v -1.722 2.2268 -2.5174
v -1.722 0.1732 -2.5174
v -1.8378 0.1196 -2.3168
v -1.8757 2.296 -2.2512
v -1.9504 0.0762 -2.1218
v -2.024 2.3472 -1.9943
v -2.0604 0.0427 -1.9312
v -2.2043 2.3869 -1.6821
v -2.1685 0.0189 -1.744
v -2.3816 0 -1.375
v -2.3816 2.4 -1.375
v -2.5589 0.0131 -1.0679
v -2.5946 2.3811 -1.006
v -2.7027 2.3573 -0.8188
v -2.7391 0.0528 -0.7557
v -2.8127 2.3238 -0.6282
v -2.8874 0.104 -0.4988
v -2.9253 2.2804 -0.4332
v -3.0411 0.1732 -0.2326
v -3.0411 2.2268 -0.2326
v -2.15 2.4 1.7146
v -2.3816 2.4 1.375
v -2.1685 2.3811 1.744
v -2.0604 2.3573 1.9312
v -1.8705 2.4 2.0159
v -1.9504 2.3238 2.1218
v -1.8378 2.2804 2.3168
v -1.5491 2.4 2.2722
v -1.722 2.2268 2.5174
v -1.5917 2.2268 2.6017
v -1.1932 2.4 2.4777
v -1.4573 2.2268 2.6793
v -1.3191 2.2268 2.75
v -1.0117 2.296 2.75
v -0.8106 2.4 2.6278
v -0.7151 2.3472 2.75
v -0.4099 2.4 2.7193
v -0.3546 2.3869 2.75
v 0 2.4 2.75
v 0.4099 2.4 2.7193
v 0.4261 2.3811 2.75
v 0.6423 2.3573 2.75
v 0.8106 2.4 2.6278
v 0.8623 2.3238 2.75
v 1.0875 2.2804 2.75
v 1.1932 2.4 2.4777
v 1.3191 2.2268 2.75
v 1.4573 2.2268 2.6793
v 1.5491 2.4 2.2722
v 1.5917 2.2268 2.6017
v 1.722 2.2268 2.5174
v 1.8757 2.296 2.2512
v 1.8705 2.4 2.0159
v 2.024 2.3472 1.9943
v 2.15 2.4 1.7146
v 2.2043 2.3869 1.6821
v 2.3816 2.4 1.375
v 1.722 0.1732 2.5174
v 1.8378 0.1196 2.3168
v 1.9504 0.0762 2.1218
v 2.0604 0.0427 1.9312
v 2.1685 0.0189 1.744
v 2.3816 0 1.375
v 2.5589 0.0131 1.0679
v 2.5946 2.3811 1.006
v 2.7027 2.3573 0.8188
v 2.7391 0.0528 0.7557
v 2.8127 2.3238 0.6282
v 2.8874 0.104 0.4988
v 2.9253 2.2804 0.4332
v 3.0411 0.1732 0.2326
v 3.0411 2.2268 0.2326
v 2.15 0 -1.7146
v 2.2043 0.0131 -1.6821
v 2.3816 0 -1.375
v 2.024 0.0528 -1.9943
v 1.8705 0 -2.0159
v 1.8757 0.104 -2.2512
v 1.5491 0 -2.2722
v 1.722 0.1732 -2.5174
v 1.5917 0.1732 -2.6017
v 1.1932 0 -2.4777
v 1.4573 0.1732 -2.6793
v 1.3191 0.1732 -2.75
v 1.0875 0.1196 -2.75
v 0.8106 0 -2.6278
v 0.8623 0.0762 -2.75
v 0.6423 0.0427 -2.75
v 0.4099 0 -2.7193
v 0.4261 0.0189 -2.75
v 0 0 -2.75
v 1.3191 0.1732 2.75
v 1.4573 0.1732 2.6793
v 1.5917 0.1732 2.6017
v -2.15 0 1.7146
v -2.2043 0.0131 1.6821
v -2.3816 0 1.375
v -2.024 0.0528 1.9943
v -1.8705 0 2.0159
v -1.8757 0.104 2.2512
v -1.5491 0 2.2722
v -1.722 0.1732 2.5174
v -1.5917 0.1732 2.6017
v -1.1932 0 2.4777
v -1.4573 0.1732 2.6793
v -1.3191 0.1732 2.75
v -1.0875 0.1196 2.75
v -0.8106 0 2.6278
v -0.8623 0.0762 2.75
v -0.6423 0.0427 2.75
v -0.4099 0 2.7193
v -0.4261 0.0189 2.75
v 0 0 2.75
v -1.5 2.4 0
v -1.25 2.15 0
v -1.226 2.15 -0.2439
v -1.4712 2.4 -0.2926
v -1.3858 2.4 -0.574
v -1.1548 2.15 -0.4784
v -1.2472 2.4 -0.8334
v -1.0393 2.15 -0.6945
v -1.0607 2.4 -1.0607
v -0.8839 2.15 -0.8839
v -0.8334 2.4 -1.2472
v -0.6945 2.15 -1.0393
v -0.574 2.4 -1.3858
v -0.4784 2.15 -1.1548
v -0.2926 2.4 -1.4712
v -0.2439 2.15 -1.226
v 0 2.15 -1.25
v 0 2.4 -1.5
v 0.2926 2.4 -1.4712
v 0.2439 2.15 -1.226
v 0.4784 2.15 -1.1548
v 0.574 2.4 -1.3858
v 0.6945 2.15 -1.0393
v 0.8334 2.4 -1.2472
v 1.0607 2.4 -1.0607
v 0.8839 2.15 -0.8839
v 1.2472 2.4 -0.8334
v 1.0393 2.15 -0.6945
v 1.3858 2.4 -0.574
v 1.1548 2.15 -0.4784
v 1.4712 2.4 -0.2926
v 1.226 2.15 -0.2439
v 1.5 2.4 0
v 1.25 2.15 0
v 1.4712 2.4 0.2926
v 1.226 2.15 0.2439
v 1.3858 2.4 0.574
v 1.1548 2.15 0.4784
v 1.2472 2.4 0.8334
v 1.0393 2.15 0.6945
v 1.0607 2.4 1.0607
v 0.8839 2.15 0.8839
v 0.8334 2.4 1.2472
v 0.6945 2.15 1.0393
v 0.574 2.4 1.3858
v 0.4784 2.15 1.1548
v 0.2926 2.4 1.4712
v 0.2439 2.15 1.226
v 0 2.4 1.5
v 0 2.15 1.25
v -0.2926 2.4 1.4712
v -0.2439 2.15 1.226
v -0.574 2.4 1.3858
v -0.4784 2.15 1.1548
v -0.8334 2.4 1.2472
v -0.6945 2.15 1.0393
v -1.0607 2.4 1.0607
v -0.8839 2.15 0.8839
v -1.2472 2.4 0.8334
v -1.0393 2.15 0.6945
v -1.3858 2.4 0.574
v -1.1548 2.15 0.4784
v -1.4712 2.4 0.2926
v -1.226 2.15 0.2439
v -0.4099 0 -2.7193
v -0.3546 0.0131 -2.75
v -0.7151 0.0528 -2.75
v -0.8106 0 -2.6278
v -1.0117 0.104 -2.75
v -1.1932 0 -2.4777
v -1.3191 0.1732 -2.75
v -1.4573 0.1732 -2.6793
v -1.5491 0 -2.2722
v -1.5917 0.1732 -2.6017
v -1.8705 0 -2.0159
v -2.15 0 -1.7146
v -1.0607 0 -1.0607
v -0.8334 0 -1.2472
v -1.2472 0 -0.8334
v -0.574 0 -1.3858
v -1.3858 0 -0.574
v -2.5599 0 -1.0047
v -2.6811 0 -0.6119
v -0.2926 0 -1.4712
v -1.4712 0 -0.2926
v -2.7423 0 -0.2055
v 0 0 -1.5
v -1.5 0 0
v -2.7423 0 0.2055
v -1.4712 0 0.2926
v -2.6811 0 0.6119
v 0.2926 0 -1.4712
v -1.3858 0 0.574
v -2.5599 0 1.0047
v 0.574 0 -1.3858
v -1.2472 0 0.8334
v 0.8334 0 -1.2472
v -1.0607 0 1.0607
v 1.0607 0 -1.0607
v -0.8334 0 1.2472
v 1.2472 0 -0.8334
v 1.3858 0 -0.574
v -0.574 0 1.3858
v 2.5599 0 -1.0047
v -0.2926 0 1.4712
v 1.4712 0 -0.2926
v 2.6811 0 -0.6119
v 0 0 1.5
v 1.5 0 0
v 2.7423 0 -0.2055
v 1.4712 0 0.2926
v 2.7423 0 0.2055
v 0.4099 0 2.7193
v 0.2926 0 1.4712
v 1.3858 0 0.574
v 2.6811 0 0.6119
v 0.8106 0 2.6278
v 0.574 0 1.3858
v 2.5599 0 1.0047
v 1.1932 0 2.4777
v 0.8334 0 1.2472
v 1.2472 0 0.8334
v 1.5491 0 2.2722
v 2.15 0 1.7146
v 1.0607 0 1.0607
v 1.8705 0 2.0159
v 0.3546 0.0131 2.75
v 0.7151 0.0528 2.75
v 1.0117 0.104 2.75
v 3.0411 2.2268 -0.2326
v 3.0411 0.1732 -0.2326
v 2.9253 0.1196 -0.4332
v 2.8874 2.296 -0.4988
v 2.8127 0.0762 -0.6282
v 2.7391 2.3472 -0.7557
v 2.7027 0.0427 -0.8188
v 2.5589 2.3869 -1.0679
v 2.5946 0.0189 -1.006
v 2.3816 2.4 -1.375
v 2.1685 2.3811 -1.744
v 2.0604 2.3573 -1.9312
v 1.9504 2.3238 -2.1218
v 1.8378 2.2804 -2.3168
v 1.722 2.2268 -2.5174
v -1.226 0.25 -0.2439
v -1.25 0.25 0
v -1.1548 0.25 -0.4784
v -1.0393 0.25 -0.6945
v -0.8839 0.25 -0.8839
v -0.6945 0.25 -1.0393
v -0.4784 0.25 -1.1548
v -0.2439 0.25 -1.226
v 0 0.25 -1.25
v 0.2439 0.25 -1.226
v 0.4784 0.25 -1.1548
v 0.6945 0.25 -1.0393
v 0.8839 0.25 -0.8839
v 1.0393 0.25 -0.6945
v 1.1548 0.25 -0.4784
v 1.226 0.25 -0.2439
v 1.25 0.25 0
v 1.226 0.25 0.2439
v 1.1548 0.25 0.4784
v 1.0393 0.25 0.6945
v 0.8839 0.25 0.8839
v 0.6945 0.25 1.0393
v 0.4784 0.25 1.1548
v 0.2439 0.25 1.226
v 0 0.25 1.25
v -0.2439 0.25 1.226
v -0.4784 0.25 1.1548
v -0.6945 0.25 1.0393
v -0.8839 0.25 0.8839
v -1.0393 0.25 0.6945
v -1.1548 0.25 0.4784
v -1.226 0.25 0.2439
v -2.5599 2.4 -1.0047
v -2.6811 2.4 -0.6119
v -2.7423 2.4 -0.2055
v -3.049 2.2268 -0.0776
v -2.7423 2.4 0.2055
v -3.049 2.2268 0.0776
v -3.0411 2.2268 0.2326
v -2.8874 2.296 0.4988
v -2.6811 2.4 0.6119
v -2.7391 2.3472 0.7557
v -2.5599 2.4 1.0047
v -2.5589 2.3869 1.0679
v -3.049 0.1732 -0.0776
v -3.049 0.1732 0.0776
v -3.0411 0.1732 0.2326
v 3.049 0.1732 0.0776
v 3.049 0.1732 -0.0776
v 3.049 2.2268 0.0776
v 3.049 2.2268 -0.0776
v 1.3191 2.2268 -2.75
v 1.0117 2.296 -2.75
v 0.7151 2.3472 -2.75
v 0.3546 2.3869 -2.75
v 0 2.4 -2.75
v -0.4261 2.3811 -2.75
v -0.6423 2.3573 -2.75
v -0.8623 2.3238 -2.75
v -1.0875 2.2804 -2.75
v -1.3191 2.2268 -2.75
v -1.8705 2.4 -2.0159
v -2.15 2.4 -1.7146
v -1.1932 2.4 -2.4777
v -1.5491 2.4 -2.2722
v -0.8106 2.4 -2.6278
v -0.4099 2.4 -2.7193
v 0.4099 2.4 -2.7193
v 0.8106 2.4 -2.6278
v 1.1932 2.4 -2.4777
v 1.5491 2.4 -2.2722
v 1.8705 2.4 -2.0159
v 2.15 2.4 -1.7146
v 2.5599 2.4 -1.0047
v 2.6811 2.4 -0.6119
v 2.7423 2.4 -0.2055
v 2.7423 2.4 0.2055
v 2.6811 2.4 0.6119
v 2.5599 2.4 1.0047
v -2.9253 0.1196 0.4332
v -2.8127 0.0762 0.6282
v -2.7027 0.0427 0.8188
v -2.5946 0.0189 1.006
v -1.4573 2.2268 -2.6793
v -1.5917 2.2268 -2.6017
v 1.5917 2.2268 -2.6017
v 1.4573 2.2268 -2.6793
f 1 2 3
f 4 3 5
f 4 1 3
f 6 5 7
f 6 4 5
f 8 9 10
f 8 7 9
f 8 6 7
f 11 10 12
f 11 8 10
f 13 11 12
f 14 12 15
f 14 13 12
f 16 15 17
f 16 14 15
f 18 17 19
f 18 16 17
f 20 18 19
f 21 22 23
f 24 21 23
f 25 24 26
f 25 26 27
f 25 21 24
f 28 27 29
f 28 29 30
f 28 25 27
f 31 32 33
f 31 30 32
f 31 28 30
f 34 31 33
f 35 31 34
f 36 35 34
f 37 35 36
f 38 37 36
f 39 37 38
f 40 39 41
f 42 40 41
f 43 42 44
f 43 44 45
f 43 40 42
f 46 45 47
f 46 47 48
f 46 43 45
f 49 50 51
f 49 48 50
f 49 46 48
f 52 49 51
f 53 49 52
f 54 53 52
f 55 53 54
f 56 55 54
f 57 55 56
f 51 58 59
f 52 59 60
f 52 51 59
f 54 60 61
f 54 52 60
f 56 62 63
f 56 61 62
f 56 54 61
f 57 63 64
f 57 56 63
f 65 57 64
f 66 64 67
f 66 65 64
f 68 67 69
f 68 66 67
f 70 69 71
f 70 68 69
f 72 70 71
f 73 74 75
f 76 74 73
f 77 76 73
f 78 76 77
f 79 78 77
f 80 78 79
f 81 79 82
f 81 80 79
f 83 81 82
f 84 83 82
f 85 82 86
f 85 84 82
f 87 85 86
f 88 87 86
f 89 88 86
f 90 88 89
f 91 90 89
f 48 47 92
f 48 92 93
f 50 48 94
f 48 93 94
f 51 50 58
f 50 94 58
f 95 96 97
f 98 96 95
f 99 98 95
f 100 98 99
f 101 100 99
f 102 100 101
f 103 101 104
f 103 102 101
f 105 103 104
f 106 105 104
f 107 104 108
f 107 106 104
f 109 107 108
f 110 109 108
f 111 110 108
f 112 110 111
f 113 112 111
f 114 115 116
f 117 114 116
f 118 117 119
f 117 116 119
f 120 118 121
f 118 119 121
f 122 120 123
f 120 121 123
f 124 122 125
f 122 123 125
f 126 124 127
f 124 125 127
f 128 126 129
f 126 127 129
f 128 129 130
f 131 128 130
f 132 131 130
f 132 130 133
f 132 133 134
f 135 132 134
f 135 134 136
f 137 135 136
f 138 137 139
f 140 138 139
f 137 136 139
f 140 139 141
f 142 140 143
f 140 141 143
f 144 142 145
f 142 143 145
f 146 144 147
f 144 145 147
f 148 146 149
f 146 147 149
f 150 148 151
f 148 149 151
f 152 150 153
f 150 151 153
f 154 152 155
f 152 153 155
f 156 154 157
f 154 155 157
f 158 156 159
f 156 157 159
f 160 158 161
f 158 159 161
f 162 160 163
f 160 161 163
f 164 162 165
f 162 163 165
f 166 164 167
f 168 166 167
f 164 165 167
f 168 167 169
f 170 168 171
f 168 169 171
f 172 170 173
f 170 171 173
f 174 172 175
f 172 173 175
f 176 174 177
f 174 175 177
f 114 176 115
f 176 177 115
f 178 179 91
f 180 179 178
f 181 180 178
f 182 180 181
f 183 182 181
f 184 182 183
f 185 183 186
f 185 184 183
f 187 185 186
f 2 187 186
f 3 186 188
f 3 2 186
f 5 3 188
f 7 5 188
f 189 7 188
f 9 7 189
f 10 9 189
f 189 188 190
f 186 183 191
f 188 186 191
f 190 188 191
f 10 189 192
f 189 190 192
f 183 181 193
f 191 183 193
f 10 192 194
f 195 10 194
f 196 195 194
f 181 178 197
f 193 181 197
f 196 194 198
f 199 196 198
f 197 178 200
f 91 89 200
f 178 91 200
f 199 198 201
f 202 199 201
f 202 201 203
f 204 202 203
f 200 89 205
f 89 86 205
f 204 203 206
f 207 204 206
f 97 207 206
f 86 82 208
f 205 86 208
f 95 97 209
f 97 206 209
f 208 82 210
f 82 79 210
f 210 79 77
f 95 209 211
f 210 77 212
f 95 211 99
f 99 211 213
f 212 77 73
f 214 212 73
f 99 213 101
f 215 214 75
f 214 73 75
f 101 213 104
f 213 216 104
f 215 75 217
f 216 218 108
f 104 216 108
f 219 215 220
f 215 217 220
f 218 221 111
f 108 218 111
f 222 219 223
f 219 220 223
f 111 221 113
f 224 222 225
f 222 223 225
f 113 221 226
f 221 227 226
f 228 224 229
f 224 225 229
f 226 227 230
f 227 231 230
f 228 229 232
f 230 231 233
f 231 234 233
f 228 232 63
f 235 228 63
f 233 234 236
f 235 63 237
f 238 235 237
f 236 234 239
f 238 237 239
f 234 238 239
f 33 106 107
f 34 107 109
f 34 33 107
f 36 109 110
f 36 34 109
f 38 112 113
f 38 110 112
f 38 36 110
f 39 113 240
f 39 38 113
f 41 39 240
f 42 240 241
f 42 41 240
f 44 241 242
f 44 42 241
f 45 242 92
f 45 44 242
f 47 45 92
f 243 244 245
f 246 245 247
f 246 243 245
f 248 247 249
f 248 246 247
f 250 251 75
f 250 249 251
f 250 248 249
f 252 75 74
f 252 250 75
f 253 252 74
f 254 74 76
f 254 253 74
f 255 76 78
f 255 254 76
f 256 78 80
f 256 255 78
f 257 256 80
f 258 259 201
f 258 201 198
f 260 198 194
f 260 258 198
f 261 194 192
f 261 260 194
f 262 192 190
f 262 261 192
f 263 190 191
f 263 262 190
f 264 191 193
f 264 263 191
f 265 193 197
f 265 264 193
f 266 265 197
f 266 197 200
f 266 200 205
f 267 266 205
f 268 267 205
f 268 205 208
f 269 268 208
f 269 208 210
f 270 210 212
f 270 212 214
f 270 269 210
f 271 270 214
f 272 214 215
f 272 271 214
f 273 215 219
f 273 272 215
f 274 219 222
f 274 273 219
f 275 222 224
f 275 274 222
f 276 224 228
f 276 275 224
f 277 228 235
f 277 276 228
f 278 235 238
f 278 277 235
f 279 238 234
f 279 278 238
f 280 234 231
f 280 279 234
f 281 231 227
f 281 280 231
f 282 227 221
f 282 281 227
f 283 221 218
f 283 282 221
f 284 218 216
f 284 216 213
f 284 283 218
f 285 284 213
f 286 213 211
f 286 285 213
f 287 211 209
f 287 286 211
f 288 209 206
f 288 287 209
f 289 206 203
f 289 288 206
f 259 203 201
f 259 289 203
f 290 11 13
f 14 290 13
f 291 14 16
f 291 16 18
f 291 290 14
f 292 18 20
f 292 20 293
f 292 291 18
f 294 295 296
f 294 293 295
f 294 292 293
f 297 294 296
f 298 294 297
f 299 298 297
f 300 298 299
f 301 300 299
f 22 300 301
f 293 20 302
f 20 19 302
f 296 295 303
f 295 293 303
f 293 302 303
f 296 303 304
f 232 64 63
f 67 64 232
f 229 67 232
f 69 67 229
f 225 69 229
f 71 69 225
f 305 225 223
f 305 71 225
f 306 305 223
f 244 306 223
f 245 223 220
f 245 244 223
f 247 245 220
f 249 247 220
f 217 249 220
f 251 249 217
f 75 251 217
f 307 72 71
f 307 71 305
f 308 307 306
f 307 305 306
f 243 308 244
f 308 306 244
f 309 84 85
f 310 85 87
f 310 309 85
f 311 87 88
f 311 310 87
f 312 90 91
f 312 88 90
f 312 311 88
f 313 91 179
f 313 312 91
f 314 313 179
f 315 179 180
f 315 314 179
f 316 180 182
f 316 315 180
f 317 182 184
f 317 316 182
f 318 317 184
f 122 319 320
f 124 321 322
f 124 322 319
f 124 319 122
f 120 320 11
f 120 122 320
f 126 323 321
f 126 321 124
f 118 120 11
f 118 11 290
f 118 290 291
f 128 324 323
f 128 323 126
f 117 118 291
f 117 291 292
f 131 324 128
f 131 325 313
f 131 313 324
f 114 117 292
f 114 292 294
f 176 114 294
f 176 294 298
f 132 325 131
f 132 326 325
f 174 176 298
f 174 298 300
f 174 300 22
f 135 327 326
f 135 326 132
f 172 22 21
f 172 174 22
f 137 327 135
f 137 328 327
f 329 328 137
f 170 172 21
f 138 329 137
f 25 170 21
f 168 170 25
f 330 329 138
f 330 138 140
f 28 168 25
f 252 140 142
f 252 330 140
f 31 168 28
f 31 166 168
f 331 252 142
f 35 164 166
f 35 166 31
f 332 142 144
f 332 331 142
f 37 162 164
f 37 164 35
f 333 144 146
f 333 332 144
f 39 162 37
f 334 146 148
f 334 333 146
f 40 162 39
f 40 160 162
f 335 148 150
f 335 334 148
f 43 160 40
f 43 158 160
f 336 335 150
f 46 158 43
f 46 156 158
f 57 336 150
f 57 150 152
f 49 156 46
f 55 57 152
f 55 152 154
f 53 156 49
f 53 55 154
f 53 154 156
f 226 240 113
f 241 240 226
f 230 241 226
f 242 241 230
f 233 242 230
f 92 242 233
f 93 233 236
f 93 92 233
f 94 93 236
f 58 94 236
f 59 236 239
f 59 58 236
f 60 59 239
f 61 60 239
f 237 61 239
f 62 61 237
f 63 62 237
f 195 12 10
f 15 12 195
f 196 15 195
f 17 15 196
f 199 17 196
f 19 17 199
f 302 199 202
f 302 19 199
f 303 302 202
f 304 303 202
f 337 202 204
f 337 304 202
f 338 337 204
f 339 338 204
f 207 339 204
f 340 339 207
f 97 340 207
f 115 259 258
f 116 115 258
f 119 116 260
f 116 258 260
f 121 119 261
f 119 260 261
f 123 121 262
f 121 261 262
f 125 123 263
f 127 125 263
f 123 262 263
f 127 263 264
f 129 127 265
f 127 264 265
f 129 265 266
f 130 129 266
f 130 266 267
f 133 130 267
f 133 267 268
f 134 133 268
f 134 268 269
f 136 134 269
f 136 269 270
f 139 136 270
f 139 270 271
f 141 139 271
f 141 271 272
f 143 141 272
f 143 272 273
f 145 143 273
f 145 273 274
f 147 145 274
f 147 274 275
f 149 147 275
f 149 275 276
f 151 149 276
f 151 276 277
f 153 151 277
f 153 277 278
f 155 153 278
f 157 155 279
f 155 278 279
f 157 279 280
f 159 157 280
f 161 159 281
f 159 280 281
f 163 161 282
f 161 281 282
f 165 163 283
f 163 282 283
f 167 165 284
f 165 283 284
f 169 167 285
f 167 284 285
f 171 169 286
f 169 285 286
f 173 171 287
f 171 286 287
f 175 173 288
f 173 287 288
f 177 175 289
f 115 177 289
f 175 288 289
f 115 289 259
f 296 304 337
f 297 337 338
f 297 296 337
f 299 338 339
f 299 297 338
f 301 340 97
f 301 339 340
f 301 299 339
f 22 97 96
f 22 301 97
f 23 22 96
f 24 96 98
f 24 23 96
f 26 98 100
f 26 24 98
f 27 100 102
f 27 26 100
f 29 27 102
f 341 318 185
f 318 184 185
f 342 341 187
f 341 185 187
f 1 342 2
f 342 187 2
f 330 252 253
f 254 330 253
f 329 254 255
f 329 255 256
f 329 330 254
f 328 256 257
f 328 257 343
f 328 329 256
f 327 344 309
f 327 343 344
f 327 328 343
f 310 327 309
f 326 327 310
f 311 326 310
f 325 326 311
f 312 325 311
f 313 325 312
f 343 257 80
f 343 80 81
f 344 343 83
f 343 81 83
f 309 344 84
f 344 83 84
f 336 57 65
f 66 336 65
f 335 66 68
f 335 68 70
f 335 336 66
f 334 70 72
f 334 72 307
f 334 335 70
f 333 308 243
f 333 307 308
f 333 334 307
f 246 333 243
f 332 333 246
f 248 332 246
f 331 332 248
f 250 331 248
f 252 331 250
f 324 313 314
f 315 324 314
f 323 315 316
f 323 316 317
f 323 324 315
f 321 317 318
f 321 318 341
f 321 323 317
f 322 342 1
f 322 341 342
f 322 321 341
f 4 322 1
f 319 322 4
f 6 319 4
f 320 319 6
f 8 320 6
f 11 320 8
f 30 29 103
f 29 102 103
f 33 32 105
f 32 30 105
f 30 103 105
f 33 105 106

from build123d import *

# Parameters (mm, degrees)
SKETCH1_R           = 3.05
BOSS_EXTRUDE1_DEPTH = 2.4
SKETCH2_OUTSIDE_W   = 9.89
SKETCH2_OUTSIDE_H   = 9.89
CUT_EXTRUDE1_DEPTH  = 2.4
M3_TAPPED_HOLE1_D   = 2.5
CHAMFER1_SIZE       = 0.25


with BuildPart() as part:
    # Sketch1 → Boss-Extrude1 (new body)
    with BuildSketch(Plane(origin=(0, 0, 0), x_dir=(1, 0, 0), z_dir=(0, 1, 0))):
        with Locations(Location((0, 0, 0), (0, 0, 270))):
            Circle(SKETCH1_R)
    extrude(amount=BOSS_EXTRUDE1_DEPTH)

    # Sketch2 outside → Cut-Extrude1 (cut)
    with BuildSketch(Plane(origin=(0, 2.4, 0), x_dir=(1, 0, 0), z_dir=(0, 1, 0))):
        Rectangle(SKETCH2_OUTSIDE_W, SKETCH2_OUTSIDE_H)
        Polygon((1.58771324, 2.75), (-1.58771324, 2.75), (-3.175426481, 0), (-1.58771324, -2.75), (1.58771324, -2.75), (3.175426481, 0), align=None, mode=Mode.SUBTRACT)
    extrude(amount=-CUT_EXTRUDE1_DEPTH, mode=Mode.SUBTRACT)

    # Sketch3 → Cut-Revolve1 (revolve, cut)
    with BuildSketch(Plane(origin=(0, 0, 0), x_dir=(0, 0, -1), z_dir=(1, 0, 0))):
        Polygon((2.75, 2.4), (4, 2.4), (4, 1.678312164), align=None)
        Polygon((4, 0), (2.75, 0), (4, 0.721687836), align=None)
    revolve(axis=Axis((0, 0, 0), (0, 1, 0)), mode=Mode.SUBTRACT)

    # M3 Tapped Hole1 (through all)
    with Locations(Plane(origin=(0, 2.4, 0), x_dir=(1, 0, 0), z_dir=(0, 1, 0))):
        with Locations((0, 0)):
            Hole(M3_TAPPED_HOLE1_D / 2)

    # Chamfer1
    chamfer1_edges = [part.edges().sort_by_distance(p)[0] for p in [
        (1.25, 2.4, 0),
        (1.25, 0, 0),
    ]]
    chamfer(chamfer1_edges, length=CHAMFER1_SIZE)


solid = part.part
